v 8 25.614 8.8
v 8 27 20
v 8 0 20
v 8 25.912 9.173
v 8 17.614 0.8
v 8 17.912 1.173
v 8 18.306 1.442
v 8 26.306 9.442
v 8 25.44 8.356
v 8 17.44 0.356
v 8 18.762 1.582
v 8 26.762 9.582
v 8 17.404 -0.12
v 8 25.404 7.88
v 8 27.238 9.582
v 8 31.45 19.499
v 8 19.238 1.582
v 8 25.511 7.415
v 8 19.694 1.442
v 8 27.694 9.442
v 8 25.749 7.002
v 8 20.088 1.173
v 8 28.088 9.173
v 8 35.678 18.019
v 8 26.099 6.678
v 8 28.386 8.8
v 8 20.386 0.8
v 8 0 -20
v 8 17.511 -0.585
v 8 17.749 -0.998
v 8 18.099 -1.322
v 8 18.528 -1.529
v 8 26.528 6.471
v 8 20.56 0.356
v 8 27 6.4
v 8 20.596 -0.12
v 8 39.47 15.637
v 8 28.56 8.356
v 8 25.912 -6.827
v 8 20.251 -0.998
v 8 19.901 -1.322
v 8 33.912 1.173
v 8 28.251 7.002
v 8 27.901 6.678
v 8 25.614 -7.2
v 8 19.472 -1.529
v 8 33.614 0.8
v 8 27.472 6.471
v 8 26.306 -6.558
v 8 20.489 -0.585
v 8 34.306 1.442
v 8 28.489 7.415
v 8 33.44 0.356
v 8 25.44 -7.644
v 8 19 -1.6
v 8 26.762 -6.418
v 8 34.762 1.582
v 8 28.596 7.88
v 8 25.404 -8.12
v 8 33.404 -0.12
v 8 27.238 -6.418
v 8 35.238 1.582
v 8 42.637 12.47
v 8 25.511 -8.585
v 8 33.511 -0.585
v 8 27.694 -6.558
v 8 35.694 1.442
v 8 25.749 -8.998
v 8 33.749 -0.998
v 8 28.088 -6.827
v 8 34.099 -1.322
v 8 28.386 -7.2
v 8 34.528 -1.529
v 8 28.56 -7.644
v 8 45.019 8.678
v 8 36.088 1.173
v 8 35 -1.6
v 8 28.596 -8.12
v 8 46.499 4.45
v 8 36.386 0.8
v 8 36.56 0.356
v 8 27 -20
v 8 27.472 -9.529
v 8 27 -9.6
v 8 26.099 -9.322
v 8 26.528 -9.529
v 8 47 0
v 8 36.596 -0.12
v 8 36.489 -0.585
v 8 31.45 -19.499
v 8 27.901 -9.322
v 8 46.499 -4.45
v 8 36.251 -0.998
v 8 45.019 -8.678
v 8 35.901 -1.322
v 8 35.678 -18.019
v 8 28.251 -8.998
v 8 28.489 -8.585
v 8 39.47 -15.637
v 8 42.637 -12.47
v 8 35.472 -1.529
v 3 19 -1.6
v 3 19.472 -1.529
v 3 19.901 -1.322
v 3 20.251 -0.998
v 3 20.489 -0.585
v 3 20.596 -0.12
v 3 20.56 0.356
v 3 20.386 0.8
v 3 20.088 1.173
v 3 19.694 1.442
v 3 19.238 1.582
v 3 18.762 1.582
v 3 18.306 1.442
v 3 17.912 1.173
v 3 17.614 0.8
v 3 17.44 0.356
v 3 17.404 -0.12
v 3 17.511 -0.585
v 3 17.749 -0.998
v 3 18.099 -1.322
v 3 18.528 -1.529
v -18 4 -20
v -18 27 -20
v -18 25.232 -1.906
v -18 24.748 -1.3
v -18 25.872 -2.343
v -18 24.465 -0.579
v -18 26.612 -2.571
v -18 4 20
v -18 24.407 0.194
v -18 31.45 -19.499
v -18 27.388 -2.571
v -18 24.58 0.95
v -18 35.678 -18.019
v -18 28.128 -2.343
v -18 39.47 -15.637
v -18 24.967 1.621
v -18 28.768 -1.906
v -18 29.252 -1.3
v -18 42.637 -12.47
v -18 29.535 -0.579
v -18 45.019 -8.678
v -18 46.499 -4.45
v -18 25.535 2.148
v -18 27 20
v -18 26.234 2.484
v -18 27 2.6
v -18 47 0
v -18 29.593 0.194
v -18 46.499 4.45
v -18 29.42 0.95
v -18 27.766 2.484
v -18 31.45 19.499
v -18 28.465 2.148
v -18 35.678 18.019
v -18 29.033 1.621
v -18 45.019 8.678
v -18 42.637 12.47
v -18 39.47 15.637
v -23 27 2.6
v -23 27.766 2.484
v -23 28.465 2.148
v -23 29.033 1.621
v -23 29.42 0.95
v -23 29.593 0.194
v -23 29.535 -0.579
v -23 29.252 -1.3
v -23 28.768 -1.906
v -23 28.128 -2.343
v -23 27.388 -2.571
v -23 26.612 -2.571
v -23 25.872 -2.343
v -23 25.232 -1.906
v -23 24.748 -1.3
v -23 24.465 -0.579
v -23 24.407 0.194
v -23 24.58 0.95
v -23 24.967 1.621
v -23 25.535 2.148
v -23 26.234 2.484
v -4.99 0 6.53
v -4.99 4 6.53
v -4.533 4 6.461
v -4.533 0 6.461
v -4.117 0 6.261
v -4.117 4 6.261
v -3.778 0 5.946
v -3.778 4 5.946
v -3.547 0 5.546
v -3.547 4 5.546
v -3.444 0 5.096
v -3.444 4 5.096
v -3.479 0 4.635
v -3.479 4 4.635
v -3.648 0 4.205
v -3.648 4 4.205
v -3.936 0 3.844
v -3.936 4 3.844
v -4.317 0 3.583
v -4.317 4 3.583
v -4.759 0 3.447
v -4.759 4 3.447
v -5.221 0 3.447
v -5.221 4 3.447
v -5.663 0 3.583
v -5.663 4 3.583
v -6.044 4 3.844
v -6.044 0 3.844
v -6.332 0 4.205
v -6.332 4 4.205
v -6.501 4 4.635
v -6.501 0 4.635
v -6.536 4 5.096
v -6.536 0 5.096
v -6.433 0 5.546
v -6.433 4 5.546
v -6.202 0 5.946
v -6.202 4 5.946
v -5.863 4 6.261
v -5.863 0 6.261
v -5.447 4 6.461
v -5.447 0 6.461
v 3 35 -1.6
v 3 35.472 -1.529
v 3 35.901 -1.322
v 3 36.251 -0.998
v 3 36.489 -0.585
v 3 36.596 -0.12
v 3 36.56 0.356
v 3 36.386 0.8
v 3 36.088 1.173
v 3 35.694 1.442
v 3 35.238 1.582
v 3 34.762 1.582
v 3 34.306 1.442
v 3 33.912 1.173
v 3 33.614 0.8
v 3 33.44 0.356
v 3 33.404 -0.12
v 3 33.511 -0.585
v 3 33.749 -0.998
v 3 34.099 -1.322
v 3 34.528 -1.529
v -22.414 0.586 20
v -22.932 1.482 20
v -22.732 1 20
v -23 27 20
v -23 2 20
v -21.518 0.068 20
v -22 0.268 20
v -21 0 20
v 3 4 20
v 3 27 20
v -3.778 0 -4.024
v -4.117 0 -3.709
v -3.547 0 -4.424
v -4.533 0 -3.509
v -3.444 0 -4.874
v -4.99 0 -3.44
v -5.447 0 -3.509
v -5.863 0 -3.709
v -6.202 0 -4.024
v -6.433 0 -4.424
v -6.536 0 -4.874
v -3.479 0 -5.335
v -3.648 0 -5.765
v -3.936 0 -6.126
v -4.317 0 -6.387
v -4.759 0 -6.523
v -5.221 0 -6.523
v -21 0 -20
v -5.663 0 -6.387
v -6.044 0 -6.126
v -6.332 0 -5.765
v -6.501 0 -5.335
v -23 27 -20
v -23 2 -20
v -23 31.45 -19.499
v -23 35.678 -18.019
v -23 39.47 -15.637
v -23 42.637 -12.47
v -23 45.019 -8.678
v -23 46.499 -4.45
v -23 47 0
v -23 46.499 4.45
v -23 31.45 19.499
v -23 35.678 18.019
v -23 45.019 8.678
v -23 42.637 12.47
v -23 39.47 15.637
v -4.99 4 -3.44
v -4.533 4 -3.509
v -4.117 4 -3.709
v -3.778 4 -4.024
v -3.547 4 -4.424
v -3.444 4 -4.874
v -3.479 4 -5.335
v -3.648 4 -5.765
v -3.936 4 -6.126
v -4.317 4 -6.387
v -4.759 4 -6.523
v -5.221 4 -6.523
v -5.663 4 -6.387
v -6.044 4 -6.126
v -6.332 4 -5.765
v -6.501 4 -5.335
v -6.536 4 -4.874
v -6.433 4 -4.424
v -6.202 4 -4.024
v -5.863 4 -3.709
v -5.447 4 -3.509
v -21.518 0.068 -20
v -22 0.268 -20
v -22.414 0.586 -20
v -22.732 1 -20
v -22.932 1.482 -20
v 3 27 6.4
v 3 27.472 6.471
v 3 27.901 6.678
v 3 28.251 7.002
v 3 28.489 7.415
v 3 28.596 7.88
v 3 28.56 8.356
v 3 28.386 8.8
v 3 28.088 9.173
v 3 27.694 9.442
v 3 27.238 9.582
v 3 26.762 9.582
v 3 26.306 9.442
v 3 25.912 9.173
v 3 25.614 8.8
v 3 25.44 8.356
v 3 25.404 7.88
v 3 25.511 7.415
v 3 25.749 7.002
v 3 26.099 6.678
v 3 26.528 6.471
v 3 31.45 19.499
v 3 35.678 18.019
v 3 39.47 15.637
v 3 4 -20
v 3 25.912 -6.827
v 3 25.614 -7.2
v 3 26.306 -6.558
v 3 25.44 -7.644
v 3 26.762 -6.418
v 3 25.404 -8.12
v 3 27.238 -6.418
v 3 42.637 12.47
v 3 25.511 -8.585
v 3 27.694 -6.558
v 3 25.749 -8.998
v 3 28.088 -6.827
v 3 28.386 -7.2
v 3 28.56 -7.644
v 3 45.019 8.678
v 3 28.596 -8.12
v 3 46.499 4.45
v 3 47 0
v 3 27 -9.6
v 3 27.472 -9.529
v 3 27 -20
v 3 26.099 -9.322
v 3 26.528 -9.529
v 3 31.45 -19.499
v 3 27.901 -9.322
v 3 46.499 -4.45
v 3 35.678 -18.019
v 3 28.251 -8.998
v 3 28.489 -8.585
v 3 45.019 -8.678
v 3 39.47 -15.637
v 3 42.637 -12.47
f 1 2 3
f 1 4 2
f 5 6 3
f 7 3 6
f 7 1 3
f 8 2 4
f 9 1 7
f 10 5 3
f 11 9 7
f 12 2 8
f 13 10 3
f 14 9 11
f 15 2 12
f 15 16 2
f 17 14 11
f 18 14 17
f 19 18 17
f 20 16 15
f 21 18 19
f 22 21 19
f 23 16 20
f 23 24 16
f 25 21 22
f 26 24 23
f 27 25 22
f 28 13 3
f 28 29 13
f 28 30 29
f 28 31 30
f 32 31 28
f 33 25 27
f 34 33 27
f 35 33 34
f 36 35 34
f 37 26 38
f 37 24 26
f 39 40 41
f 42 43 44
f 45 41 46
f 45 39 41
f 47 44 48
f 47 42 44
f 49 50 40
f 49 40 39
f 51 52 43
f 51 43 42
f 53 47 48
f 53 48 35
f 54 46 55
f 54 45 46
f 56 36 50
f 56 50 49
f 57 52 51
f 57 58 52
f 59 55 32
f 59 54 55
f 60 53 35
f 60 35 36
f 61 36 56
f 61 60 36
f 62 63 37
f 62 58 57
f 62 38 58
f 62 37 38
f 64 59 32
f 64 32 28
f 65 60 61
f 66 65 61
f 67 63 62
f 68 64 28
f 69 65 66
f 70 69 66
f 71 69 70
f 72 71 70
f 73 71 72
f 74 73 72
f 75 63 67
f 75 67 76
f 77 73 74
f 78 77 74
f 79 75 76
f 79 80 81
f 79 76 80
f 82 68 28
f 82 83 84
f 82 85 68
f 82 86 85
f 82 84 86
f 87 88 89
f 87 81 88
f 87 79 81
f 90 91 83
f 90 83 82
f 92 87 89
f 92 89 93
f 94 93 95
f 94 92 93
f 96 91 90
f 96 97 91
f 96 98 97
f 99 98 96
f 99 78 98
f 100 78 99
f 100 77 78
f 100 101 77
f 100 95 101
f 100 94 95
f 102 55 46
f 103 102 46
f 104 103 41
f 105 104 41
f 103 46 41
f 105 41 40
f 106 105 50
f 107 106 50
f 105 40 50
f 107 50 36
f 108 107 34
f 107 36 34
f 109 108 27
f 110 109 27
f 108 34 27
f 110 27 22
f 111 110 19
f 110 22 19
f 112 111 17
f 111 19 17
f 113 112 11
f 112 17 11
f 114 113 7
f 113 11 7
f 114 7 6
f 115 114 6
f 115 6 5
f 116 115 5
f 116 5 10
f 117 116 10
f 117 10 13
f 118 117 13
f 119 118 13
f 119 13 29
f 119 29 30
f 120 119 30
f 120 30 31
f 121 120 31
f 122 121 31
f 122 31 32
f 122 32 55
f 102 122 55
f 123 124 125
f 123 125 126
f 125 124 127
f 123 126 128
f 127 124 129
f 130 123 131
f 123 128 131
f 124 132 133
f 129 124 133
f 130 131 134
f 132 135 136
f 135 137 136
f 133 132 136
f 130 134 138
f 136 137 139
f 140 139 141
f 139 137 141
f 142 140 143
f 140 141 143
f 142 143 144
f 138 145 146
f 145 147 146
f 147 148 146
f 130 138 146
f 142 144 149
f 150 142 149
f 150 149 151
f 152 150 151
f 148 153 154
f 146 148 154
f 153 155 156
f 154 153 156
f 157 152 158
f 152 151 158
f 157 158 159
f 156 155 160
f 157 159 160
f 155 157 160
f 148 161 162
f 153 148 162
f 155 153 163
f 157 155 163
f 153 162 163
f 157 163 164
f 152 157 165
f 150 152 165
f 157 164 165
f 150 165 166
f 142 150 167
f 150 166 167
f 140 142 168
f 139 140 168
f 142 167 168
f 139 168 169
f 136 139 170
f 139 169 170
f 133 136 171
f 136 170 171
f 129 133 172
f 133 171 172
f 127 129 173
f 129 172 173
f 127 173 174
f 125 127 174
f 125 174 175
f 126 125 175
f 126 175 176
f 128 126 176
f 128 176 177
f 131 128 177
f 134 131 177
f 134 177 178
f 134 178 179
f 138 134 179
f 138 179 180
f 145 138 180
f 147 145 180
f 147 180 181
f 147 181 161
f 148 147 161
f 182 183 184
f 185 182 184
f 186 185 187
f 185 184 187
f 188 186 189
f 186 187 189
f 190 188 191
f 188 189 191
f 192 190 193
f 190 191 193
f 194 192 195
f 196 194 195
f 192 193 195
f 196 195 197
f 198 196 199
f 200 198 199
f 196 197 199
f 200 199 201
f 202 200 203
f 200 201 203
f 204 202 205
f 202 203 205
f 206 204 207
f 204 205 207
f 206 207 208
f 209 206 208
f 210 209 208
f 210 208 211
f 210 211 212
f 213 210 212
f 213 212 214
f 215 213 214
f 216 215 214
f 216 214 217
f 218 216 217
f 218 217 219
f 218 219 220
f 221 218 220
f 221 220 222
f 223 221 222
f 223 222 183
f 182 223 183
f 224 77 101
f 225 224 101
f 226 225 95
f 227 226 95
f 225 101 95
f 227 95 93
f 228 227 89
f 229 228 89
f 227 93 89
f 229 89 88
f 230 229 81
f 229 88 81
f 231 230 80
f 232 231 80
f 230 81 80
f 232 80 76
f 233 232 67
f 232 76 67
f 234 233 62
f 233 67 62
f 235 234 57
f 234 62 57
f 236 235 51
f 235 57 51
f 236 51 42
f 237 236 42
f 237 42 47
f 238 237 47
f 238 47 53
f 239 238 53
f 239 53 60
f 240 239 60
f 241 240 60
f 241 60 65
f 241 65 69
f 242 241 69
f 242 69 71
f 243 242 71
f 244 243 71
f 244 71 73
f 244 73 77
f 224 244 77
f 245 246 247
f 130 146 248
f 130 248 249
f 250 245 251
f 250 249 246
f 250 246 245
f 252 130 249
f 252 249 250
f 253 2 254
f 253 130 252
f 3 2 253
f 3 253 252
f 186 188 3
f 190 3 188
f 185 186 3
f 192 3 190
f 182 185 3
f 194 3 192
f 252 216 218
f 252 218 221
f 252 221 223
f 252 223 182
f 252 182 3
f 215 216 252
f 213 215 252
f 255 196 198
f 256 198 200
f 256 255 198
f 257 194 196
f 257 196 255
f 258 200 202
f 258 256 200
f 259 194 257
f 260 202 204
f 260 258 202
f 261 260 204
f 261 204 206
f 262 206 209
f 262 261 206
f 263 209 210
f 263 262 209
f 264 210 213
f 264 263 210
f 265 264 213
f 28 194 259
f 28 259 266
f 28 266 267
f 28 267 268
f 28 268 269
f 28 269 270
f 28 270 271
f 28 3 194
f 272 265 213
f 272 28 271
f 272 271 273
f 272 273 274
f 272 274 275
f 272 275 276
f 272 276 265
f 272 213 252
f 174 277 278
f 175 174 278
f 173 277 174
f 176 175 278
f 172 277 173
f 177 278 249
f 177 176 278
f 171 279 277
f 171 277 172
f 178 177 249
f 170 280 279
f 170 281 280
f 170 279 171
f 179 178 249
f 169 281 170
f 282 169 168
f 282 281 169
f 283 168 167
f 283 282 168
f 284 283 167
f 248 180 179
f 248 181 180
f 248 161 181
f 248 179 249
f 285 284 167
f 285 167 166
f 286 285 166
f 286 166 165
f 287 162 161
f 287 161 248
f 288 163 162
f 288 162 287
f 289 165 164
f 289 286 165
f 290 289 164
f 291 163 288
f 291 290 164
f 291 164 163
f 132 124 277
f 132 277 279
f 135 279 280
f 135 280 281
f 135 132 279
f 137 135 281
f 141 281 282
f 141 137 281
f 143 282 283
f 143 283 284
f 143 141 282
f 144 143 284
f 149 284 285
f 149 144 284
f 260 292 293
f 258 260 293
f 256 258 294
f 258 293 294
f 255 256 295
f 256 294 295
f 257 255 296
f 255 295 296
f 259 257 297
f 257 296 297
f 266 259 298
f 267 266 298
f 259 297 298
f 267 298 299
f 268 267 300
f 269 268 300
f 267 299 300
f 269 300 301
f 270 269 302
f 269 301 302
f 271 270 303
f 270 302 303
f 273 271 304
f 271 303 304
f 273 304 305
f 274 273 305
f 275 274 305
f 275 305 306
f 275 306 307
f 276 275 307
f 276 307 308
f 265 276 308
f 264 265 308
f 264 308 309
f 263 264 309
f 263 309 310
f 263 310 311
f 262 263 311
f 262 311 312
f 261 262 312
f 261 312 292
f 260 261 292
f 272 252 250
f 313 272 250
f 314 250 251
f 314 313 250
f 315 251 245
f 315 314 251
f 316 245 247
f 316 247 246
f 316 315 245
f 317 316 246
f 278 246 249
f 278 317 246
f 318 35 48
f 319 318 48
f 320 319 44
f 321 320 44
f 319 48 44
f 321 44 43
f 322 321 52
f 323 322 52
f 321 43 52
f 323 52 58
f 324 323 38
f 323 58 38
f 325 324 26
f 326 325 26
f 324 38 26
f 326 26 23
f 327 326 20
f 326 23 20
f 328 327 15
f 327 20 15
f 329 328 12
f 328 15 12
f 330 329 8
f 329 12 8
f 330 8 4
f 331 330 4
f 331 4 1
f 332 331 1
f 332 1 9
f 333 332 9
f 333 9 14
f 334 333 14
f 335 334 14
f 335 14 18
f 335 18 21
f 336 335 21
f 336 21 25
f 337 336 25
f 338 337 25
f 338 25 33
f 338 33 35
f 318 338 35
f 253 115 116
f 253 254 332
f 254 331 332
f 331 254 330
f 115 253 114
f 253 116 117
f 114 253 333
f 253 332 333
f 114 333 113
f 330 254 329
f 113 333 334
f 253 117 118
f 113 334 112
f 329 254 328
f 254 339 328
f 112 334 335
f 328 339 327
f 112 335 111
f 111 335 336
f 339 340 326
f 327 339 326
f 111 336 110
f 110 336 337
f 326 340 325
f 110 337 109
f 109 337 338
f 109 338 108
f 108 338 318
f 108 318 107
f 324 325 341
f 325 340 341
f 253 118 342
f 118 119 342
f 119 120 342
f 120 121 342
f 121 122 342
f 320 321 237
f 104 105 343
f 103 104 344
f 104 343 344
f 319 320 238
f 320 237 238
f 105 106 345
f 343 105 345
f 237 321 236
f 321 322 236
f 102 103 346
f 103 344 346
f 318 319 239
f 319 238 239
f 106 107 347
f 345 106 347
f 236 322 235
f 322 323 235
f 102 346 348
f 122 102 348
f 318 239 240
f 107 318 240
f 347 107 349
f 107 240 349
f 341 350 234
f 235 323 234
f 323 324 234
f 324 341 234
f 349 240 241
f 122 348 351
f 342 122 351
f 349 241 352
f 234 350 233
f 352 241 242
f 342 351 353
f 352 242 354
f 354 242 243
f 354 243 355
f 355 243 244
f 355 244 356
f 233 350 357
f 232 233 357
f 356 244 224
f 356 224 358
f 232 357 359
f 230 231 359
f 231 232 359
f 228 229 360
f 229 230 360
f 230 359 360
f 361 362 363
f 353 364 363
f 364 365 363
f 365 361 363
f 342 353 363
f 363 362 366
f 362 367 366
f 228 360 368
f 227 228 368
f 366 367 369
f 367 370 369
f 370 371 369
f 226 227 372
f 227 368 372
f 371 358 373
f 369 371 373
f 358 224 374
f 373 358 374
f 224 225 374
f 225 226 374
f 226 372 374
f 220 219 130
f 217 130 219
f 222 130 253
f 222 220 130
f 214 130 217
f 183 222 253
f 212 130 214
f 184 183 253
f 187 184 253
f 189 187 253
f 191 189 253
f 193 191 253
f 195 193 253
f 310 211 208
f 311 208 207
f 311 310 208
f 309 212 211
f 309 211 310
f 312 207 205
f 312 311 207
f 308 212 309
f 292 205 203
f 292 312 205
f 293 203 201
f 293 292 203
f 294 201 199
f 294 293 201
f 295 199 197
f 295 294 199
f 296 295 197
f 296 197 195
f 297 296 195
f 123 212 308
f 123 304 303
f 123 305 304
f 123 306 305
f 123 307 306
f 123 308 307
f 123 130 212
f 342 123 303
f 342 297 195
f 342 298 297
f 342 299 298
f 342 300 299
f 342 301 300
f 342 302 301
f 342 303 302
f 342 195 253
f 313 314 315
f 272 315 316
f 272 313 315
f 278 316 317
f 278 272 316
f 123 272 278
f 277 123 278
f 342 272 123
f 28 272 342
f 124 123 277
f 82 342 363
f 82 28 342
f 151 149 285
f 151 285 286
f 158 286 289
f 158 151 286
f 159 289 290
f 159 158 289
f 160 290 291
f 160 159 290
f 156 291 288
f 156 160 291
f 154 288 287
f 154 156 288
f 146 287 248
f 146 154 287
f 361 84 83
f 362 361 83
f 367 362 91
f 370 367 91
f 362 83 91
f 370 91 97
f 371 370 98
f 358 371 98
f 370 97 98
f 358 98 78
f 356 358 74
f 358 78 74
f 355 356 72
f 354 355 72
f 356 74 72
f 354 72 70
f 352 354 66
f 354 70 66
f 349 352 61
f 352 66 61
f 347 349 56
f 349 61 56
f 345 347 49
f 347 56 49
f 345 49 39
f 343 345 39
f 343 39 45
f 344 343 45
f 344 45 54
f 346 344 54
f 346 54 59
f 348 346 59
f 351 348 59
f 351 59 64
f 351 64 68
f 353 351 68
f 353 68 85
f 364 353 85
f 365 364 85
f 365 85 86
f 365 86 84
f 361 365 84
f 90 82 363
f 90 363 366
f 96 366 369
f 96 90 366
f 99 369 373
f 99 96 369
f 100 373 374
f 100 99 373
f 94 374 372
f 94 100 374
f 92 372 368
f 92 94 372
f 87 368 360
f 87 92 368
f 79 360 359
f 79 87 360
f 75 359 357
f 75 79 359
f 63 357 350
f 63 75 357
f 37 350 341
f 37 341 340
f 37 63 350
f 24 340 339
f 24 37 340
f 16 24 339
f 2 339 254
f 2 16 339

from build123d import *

# Parameters (mm, degrees)
SKETCH1_W             = 46
SKETCH1_H             = 40
BOSS_EXTRUDE1_DEPTH   = 4
SKETCH2_W             = 40
SKETCH2_H             = 45
BOSS_EXTRUDE2_DEPTH   = 5
BOSS_EXTRUDE3_DEPTH   = 20
SKETCH6_R             = 2.9
SKETCH6_R_2           = 1.55
SKETCH6_R_3           = 1.4
CUT_EXTRUDE2_DEPTH    = 9
FILLET1_R             = 2
FILLET2_R             = 2
CUT_EXTRUDE4_START    = -10
CUT_EXTRUDE4_DEPTH    = 10
SKETCH12_W            = 5
SKETCH12_H            = 40
CUT_EXTRUDE5_DEPTH    = 45
IZIM1_R               = 1.6
KES_EKSTR_ZYON1_DEPTH = 25
IZIM2_R               = 2.6
KES_EKSTR_ZYON2_DEPTH = 10
CUT_EXTRUDE11_DEPTH   = 15
SKETCH19_W            = 15
SKETCH19_H            = 40
CUT_EXTRUDE12_DEPTH   = 15
SKETCH20_R            = 1.4
SKETCH20_R_2          = 2.9
BOSS_EXTRUDE4_DEPTH   = 4


with BuildPart() as part:
    # Sketch1 → Boss-Extrude1 (new body)
    with BuildSketch(Plane(origin=(0, 0, 0), x_dir=(1, 0, 0), z_dir=(0, 1, 0))):
        Rectangle(SKETCH1_W, SKETCH1_H)
    extrude(amount=BOSS_EXTRUDE1_DEPTH)

    # Sketch2 → Boss-Extrude2 (add)
    with BuildSketch(Plane.ZY.offset(23)):
        with Locations((0, 26.5)):
            Rectangle(SKETCH2_W, SKETCH2_H)
    extrude(amount=-BOSS_EXTRUDE2_DEPTH)

    # Sketch3 → Boss-Extrude3 (add)
    with BuildSketch(Plane(origin=(23, 0, 0), x_dir=(0, 0, -1), z_dir=(1, 0, 0))):
        with BuildLine():
            Line((-20, 27), (-20, 2))
            Line((-20, 2), (20, 2))
            Line((20, 2), (20, 27))
            ThreePointArc((20, 27), (0, 47), (-20, 27))
        make_face()
    extrude(amount=-BOSS_EXTRUDE3_DEPTH)

    # Sketch6 → Cut-Extrude2 (cut)
    with BuildSketch(Plane(origin=(0, 4, 0), x_dir=(1, 0, 0), z_dir=(0, 1, 0))):
        with Locations(Location((0, 0, 0), (0, 0, 270))):
            Circle(SKETCH6_R)
        with Locations(Location((-4.99, 4.99, 0), (0, 0, 270))):
            Circle(SKETCH6_R_2)
        with Locations(Location((4.99, 4.99, 0), (0, 0, 270))):
            Circle(SKETCH6_R_3)
        with Locations(Location((-4.99, -4.98, 0), (0, 0, 270))):
            Circle(SKETCH6_R_2)
        with Locations(Location((4.99, -4.98, 0), (0, 0, 270))):
            Circle(SKETCH6_R_3)
    extrude(amount=-CUT_EXTRUDE2_DEPTH, mode=Mode.SUBTRACT)

    # Fillet1
    fillet1_edges = [part.edges().sort_by_distance(p)[0] for p in [
        (23, 0, 0),
    ]]
    fillet(fillet1_edges, radius=FILLET1_R)

    # Fillet2
    fillet2_edges = [part.edges().sort_by_distance(p)[0] for p in [
        (-23, 0, 0),
    ]]
    fillet(fillet2_edges, radius=FILLET2_R)

    # Sketch11 → Cut-Extrude4 (cut)
    with BuildSketch(Plane.ZY.offset(23).offset(CUT_EXTRUDE4_START)):
        with BuildLine():
            ThreePointArc((0, 47), (14.142135624, 41.142135624), (20, 27))
            Line((20, 27), (20, 47))
            Line((20, 47), (0, 47))
        make_face()
        with BuildLine():
            Line((-20, 47), (-20, 27))
            ThreePointArc((-20, 27), (-14.142135624, 41.142135624), (0, 47))
            Line((0, 47), (-20, 47))
        make_face()
    extrude(amount=CUT_EXTRUDE4_DEPTH, mode=Mode.SUBTRACT)


with BuildPart() as cut_extrude4_piece_1:
    # of the separate pieces the step leaves, piece 1, a body of its own (cut_extrude4_pieces)
    add(part.part.solids().sort_by_distance((-21, 0, -20))[0])

    # Çizim1 → Kes-Ekstrüzyon1 (cut)
    with BuildSketch(Plane(origin=(23, 0, 0), x_dir=(0, 0, -1), z_dir=(1, 0, 0))):
        with Locations((8, 27)):
            Circle(IZIM1_R)
        with Locations((0, 35)):
            Circle(IZIM1_R)
        with Locations((-8, 27)):
            Circle(IZIM1_R)
        with Locations((0, 19)):
            Circle(IZIM1_R)
    extrude(amount=-KES_EKSTR_ZYON1_DEPTH, mode=Mode.SUBTRACT)

    # Çizim2 → Kes-Ekstrüzyon2 (cut)
    with BuildSketch(Plane.ZY.offset(23)):
        with Locations((0, 27)):
            Circle(IZIM2_R)
    extrude(amount=-KES_EKSTR_ZYON2_DEPTH, mode=Mode.SUBTRACT)

    # Sketch18 → Cut-Extrude11 (cut)
    with BuildSketch(Plane(origin=(23, 0, 0), x_dir=(0, 0, -1), z_dir=(1, 0, 0))):
        with BuildLine():
            Line((-20, 27), (-20, 2))
            Line((-20, 2), (20, 2))
            Line((20, 2), (20, 27))
            ThreePointArc((20, 27), (0, 47), (-20, 27))
        make_face()
    extrude(amount=-CUT_EXTRUDE11_DEPTH, mode=Mode.SUBTRACT)

    # Sketch19 → Cut-Extrude12 (cut)
    with BuildSketch(Plane(origin=(0, 2, 0), x_dir=(1, 0, 0), z_dir=(0, 1, 0))):
        with Locations((15.5, 0)):
            Rectangle(SKETCH19_W, SKETCH19_H)
    extrude(amount=-CUT_EXTRUDE12_DEPTH, mode=Mode.SUBTRACT)

    # Sketch20 → Boss-Extrude4 (add)
    with BuildSketch(Plane(origin=(0, 0, 0), x_dir=(-1, 0, 0), z_dir=(0, -1, 0))):
        with Locations((-4.99, -4.98)):
            Circle(SKETCH20_R)
        with Locations((-4.99, 4.99)):
            Circle(SKETCH20_R)
        Circle(SKETCH20_R_2)
    extrude(amount=-BOSS_EXTRUDE4_DEPTH)


with BuildPart() as cut_extrude4_piece_2:
    # of the separate pieces the step leaves, piece 2, a body of its own (cut_extrude4_pieces)
    add(part.part.solids().sort_by_distance((-18, 47, -20))[0])

    # Sketch12 → Cut-Extrude5 (cut)
    with BuildSketch(Plane(origin=(0, 49, 0), x_dir=(1, 0, 0), z_dir=(0, 1, 0))):
        with Locations((-20.5, 0)):
            Rectangle(SKETCH12_W, SKETCH12_H)
    extrude(amount=-CUT_EXTRUDE5_DEPTH, mode=Mode.SUBTRACT)


solid = cut_extrude4_piece_1.part
